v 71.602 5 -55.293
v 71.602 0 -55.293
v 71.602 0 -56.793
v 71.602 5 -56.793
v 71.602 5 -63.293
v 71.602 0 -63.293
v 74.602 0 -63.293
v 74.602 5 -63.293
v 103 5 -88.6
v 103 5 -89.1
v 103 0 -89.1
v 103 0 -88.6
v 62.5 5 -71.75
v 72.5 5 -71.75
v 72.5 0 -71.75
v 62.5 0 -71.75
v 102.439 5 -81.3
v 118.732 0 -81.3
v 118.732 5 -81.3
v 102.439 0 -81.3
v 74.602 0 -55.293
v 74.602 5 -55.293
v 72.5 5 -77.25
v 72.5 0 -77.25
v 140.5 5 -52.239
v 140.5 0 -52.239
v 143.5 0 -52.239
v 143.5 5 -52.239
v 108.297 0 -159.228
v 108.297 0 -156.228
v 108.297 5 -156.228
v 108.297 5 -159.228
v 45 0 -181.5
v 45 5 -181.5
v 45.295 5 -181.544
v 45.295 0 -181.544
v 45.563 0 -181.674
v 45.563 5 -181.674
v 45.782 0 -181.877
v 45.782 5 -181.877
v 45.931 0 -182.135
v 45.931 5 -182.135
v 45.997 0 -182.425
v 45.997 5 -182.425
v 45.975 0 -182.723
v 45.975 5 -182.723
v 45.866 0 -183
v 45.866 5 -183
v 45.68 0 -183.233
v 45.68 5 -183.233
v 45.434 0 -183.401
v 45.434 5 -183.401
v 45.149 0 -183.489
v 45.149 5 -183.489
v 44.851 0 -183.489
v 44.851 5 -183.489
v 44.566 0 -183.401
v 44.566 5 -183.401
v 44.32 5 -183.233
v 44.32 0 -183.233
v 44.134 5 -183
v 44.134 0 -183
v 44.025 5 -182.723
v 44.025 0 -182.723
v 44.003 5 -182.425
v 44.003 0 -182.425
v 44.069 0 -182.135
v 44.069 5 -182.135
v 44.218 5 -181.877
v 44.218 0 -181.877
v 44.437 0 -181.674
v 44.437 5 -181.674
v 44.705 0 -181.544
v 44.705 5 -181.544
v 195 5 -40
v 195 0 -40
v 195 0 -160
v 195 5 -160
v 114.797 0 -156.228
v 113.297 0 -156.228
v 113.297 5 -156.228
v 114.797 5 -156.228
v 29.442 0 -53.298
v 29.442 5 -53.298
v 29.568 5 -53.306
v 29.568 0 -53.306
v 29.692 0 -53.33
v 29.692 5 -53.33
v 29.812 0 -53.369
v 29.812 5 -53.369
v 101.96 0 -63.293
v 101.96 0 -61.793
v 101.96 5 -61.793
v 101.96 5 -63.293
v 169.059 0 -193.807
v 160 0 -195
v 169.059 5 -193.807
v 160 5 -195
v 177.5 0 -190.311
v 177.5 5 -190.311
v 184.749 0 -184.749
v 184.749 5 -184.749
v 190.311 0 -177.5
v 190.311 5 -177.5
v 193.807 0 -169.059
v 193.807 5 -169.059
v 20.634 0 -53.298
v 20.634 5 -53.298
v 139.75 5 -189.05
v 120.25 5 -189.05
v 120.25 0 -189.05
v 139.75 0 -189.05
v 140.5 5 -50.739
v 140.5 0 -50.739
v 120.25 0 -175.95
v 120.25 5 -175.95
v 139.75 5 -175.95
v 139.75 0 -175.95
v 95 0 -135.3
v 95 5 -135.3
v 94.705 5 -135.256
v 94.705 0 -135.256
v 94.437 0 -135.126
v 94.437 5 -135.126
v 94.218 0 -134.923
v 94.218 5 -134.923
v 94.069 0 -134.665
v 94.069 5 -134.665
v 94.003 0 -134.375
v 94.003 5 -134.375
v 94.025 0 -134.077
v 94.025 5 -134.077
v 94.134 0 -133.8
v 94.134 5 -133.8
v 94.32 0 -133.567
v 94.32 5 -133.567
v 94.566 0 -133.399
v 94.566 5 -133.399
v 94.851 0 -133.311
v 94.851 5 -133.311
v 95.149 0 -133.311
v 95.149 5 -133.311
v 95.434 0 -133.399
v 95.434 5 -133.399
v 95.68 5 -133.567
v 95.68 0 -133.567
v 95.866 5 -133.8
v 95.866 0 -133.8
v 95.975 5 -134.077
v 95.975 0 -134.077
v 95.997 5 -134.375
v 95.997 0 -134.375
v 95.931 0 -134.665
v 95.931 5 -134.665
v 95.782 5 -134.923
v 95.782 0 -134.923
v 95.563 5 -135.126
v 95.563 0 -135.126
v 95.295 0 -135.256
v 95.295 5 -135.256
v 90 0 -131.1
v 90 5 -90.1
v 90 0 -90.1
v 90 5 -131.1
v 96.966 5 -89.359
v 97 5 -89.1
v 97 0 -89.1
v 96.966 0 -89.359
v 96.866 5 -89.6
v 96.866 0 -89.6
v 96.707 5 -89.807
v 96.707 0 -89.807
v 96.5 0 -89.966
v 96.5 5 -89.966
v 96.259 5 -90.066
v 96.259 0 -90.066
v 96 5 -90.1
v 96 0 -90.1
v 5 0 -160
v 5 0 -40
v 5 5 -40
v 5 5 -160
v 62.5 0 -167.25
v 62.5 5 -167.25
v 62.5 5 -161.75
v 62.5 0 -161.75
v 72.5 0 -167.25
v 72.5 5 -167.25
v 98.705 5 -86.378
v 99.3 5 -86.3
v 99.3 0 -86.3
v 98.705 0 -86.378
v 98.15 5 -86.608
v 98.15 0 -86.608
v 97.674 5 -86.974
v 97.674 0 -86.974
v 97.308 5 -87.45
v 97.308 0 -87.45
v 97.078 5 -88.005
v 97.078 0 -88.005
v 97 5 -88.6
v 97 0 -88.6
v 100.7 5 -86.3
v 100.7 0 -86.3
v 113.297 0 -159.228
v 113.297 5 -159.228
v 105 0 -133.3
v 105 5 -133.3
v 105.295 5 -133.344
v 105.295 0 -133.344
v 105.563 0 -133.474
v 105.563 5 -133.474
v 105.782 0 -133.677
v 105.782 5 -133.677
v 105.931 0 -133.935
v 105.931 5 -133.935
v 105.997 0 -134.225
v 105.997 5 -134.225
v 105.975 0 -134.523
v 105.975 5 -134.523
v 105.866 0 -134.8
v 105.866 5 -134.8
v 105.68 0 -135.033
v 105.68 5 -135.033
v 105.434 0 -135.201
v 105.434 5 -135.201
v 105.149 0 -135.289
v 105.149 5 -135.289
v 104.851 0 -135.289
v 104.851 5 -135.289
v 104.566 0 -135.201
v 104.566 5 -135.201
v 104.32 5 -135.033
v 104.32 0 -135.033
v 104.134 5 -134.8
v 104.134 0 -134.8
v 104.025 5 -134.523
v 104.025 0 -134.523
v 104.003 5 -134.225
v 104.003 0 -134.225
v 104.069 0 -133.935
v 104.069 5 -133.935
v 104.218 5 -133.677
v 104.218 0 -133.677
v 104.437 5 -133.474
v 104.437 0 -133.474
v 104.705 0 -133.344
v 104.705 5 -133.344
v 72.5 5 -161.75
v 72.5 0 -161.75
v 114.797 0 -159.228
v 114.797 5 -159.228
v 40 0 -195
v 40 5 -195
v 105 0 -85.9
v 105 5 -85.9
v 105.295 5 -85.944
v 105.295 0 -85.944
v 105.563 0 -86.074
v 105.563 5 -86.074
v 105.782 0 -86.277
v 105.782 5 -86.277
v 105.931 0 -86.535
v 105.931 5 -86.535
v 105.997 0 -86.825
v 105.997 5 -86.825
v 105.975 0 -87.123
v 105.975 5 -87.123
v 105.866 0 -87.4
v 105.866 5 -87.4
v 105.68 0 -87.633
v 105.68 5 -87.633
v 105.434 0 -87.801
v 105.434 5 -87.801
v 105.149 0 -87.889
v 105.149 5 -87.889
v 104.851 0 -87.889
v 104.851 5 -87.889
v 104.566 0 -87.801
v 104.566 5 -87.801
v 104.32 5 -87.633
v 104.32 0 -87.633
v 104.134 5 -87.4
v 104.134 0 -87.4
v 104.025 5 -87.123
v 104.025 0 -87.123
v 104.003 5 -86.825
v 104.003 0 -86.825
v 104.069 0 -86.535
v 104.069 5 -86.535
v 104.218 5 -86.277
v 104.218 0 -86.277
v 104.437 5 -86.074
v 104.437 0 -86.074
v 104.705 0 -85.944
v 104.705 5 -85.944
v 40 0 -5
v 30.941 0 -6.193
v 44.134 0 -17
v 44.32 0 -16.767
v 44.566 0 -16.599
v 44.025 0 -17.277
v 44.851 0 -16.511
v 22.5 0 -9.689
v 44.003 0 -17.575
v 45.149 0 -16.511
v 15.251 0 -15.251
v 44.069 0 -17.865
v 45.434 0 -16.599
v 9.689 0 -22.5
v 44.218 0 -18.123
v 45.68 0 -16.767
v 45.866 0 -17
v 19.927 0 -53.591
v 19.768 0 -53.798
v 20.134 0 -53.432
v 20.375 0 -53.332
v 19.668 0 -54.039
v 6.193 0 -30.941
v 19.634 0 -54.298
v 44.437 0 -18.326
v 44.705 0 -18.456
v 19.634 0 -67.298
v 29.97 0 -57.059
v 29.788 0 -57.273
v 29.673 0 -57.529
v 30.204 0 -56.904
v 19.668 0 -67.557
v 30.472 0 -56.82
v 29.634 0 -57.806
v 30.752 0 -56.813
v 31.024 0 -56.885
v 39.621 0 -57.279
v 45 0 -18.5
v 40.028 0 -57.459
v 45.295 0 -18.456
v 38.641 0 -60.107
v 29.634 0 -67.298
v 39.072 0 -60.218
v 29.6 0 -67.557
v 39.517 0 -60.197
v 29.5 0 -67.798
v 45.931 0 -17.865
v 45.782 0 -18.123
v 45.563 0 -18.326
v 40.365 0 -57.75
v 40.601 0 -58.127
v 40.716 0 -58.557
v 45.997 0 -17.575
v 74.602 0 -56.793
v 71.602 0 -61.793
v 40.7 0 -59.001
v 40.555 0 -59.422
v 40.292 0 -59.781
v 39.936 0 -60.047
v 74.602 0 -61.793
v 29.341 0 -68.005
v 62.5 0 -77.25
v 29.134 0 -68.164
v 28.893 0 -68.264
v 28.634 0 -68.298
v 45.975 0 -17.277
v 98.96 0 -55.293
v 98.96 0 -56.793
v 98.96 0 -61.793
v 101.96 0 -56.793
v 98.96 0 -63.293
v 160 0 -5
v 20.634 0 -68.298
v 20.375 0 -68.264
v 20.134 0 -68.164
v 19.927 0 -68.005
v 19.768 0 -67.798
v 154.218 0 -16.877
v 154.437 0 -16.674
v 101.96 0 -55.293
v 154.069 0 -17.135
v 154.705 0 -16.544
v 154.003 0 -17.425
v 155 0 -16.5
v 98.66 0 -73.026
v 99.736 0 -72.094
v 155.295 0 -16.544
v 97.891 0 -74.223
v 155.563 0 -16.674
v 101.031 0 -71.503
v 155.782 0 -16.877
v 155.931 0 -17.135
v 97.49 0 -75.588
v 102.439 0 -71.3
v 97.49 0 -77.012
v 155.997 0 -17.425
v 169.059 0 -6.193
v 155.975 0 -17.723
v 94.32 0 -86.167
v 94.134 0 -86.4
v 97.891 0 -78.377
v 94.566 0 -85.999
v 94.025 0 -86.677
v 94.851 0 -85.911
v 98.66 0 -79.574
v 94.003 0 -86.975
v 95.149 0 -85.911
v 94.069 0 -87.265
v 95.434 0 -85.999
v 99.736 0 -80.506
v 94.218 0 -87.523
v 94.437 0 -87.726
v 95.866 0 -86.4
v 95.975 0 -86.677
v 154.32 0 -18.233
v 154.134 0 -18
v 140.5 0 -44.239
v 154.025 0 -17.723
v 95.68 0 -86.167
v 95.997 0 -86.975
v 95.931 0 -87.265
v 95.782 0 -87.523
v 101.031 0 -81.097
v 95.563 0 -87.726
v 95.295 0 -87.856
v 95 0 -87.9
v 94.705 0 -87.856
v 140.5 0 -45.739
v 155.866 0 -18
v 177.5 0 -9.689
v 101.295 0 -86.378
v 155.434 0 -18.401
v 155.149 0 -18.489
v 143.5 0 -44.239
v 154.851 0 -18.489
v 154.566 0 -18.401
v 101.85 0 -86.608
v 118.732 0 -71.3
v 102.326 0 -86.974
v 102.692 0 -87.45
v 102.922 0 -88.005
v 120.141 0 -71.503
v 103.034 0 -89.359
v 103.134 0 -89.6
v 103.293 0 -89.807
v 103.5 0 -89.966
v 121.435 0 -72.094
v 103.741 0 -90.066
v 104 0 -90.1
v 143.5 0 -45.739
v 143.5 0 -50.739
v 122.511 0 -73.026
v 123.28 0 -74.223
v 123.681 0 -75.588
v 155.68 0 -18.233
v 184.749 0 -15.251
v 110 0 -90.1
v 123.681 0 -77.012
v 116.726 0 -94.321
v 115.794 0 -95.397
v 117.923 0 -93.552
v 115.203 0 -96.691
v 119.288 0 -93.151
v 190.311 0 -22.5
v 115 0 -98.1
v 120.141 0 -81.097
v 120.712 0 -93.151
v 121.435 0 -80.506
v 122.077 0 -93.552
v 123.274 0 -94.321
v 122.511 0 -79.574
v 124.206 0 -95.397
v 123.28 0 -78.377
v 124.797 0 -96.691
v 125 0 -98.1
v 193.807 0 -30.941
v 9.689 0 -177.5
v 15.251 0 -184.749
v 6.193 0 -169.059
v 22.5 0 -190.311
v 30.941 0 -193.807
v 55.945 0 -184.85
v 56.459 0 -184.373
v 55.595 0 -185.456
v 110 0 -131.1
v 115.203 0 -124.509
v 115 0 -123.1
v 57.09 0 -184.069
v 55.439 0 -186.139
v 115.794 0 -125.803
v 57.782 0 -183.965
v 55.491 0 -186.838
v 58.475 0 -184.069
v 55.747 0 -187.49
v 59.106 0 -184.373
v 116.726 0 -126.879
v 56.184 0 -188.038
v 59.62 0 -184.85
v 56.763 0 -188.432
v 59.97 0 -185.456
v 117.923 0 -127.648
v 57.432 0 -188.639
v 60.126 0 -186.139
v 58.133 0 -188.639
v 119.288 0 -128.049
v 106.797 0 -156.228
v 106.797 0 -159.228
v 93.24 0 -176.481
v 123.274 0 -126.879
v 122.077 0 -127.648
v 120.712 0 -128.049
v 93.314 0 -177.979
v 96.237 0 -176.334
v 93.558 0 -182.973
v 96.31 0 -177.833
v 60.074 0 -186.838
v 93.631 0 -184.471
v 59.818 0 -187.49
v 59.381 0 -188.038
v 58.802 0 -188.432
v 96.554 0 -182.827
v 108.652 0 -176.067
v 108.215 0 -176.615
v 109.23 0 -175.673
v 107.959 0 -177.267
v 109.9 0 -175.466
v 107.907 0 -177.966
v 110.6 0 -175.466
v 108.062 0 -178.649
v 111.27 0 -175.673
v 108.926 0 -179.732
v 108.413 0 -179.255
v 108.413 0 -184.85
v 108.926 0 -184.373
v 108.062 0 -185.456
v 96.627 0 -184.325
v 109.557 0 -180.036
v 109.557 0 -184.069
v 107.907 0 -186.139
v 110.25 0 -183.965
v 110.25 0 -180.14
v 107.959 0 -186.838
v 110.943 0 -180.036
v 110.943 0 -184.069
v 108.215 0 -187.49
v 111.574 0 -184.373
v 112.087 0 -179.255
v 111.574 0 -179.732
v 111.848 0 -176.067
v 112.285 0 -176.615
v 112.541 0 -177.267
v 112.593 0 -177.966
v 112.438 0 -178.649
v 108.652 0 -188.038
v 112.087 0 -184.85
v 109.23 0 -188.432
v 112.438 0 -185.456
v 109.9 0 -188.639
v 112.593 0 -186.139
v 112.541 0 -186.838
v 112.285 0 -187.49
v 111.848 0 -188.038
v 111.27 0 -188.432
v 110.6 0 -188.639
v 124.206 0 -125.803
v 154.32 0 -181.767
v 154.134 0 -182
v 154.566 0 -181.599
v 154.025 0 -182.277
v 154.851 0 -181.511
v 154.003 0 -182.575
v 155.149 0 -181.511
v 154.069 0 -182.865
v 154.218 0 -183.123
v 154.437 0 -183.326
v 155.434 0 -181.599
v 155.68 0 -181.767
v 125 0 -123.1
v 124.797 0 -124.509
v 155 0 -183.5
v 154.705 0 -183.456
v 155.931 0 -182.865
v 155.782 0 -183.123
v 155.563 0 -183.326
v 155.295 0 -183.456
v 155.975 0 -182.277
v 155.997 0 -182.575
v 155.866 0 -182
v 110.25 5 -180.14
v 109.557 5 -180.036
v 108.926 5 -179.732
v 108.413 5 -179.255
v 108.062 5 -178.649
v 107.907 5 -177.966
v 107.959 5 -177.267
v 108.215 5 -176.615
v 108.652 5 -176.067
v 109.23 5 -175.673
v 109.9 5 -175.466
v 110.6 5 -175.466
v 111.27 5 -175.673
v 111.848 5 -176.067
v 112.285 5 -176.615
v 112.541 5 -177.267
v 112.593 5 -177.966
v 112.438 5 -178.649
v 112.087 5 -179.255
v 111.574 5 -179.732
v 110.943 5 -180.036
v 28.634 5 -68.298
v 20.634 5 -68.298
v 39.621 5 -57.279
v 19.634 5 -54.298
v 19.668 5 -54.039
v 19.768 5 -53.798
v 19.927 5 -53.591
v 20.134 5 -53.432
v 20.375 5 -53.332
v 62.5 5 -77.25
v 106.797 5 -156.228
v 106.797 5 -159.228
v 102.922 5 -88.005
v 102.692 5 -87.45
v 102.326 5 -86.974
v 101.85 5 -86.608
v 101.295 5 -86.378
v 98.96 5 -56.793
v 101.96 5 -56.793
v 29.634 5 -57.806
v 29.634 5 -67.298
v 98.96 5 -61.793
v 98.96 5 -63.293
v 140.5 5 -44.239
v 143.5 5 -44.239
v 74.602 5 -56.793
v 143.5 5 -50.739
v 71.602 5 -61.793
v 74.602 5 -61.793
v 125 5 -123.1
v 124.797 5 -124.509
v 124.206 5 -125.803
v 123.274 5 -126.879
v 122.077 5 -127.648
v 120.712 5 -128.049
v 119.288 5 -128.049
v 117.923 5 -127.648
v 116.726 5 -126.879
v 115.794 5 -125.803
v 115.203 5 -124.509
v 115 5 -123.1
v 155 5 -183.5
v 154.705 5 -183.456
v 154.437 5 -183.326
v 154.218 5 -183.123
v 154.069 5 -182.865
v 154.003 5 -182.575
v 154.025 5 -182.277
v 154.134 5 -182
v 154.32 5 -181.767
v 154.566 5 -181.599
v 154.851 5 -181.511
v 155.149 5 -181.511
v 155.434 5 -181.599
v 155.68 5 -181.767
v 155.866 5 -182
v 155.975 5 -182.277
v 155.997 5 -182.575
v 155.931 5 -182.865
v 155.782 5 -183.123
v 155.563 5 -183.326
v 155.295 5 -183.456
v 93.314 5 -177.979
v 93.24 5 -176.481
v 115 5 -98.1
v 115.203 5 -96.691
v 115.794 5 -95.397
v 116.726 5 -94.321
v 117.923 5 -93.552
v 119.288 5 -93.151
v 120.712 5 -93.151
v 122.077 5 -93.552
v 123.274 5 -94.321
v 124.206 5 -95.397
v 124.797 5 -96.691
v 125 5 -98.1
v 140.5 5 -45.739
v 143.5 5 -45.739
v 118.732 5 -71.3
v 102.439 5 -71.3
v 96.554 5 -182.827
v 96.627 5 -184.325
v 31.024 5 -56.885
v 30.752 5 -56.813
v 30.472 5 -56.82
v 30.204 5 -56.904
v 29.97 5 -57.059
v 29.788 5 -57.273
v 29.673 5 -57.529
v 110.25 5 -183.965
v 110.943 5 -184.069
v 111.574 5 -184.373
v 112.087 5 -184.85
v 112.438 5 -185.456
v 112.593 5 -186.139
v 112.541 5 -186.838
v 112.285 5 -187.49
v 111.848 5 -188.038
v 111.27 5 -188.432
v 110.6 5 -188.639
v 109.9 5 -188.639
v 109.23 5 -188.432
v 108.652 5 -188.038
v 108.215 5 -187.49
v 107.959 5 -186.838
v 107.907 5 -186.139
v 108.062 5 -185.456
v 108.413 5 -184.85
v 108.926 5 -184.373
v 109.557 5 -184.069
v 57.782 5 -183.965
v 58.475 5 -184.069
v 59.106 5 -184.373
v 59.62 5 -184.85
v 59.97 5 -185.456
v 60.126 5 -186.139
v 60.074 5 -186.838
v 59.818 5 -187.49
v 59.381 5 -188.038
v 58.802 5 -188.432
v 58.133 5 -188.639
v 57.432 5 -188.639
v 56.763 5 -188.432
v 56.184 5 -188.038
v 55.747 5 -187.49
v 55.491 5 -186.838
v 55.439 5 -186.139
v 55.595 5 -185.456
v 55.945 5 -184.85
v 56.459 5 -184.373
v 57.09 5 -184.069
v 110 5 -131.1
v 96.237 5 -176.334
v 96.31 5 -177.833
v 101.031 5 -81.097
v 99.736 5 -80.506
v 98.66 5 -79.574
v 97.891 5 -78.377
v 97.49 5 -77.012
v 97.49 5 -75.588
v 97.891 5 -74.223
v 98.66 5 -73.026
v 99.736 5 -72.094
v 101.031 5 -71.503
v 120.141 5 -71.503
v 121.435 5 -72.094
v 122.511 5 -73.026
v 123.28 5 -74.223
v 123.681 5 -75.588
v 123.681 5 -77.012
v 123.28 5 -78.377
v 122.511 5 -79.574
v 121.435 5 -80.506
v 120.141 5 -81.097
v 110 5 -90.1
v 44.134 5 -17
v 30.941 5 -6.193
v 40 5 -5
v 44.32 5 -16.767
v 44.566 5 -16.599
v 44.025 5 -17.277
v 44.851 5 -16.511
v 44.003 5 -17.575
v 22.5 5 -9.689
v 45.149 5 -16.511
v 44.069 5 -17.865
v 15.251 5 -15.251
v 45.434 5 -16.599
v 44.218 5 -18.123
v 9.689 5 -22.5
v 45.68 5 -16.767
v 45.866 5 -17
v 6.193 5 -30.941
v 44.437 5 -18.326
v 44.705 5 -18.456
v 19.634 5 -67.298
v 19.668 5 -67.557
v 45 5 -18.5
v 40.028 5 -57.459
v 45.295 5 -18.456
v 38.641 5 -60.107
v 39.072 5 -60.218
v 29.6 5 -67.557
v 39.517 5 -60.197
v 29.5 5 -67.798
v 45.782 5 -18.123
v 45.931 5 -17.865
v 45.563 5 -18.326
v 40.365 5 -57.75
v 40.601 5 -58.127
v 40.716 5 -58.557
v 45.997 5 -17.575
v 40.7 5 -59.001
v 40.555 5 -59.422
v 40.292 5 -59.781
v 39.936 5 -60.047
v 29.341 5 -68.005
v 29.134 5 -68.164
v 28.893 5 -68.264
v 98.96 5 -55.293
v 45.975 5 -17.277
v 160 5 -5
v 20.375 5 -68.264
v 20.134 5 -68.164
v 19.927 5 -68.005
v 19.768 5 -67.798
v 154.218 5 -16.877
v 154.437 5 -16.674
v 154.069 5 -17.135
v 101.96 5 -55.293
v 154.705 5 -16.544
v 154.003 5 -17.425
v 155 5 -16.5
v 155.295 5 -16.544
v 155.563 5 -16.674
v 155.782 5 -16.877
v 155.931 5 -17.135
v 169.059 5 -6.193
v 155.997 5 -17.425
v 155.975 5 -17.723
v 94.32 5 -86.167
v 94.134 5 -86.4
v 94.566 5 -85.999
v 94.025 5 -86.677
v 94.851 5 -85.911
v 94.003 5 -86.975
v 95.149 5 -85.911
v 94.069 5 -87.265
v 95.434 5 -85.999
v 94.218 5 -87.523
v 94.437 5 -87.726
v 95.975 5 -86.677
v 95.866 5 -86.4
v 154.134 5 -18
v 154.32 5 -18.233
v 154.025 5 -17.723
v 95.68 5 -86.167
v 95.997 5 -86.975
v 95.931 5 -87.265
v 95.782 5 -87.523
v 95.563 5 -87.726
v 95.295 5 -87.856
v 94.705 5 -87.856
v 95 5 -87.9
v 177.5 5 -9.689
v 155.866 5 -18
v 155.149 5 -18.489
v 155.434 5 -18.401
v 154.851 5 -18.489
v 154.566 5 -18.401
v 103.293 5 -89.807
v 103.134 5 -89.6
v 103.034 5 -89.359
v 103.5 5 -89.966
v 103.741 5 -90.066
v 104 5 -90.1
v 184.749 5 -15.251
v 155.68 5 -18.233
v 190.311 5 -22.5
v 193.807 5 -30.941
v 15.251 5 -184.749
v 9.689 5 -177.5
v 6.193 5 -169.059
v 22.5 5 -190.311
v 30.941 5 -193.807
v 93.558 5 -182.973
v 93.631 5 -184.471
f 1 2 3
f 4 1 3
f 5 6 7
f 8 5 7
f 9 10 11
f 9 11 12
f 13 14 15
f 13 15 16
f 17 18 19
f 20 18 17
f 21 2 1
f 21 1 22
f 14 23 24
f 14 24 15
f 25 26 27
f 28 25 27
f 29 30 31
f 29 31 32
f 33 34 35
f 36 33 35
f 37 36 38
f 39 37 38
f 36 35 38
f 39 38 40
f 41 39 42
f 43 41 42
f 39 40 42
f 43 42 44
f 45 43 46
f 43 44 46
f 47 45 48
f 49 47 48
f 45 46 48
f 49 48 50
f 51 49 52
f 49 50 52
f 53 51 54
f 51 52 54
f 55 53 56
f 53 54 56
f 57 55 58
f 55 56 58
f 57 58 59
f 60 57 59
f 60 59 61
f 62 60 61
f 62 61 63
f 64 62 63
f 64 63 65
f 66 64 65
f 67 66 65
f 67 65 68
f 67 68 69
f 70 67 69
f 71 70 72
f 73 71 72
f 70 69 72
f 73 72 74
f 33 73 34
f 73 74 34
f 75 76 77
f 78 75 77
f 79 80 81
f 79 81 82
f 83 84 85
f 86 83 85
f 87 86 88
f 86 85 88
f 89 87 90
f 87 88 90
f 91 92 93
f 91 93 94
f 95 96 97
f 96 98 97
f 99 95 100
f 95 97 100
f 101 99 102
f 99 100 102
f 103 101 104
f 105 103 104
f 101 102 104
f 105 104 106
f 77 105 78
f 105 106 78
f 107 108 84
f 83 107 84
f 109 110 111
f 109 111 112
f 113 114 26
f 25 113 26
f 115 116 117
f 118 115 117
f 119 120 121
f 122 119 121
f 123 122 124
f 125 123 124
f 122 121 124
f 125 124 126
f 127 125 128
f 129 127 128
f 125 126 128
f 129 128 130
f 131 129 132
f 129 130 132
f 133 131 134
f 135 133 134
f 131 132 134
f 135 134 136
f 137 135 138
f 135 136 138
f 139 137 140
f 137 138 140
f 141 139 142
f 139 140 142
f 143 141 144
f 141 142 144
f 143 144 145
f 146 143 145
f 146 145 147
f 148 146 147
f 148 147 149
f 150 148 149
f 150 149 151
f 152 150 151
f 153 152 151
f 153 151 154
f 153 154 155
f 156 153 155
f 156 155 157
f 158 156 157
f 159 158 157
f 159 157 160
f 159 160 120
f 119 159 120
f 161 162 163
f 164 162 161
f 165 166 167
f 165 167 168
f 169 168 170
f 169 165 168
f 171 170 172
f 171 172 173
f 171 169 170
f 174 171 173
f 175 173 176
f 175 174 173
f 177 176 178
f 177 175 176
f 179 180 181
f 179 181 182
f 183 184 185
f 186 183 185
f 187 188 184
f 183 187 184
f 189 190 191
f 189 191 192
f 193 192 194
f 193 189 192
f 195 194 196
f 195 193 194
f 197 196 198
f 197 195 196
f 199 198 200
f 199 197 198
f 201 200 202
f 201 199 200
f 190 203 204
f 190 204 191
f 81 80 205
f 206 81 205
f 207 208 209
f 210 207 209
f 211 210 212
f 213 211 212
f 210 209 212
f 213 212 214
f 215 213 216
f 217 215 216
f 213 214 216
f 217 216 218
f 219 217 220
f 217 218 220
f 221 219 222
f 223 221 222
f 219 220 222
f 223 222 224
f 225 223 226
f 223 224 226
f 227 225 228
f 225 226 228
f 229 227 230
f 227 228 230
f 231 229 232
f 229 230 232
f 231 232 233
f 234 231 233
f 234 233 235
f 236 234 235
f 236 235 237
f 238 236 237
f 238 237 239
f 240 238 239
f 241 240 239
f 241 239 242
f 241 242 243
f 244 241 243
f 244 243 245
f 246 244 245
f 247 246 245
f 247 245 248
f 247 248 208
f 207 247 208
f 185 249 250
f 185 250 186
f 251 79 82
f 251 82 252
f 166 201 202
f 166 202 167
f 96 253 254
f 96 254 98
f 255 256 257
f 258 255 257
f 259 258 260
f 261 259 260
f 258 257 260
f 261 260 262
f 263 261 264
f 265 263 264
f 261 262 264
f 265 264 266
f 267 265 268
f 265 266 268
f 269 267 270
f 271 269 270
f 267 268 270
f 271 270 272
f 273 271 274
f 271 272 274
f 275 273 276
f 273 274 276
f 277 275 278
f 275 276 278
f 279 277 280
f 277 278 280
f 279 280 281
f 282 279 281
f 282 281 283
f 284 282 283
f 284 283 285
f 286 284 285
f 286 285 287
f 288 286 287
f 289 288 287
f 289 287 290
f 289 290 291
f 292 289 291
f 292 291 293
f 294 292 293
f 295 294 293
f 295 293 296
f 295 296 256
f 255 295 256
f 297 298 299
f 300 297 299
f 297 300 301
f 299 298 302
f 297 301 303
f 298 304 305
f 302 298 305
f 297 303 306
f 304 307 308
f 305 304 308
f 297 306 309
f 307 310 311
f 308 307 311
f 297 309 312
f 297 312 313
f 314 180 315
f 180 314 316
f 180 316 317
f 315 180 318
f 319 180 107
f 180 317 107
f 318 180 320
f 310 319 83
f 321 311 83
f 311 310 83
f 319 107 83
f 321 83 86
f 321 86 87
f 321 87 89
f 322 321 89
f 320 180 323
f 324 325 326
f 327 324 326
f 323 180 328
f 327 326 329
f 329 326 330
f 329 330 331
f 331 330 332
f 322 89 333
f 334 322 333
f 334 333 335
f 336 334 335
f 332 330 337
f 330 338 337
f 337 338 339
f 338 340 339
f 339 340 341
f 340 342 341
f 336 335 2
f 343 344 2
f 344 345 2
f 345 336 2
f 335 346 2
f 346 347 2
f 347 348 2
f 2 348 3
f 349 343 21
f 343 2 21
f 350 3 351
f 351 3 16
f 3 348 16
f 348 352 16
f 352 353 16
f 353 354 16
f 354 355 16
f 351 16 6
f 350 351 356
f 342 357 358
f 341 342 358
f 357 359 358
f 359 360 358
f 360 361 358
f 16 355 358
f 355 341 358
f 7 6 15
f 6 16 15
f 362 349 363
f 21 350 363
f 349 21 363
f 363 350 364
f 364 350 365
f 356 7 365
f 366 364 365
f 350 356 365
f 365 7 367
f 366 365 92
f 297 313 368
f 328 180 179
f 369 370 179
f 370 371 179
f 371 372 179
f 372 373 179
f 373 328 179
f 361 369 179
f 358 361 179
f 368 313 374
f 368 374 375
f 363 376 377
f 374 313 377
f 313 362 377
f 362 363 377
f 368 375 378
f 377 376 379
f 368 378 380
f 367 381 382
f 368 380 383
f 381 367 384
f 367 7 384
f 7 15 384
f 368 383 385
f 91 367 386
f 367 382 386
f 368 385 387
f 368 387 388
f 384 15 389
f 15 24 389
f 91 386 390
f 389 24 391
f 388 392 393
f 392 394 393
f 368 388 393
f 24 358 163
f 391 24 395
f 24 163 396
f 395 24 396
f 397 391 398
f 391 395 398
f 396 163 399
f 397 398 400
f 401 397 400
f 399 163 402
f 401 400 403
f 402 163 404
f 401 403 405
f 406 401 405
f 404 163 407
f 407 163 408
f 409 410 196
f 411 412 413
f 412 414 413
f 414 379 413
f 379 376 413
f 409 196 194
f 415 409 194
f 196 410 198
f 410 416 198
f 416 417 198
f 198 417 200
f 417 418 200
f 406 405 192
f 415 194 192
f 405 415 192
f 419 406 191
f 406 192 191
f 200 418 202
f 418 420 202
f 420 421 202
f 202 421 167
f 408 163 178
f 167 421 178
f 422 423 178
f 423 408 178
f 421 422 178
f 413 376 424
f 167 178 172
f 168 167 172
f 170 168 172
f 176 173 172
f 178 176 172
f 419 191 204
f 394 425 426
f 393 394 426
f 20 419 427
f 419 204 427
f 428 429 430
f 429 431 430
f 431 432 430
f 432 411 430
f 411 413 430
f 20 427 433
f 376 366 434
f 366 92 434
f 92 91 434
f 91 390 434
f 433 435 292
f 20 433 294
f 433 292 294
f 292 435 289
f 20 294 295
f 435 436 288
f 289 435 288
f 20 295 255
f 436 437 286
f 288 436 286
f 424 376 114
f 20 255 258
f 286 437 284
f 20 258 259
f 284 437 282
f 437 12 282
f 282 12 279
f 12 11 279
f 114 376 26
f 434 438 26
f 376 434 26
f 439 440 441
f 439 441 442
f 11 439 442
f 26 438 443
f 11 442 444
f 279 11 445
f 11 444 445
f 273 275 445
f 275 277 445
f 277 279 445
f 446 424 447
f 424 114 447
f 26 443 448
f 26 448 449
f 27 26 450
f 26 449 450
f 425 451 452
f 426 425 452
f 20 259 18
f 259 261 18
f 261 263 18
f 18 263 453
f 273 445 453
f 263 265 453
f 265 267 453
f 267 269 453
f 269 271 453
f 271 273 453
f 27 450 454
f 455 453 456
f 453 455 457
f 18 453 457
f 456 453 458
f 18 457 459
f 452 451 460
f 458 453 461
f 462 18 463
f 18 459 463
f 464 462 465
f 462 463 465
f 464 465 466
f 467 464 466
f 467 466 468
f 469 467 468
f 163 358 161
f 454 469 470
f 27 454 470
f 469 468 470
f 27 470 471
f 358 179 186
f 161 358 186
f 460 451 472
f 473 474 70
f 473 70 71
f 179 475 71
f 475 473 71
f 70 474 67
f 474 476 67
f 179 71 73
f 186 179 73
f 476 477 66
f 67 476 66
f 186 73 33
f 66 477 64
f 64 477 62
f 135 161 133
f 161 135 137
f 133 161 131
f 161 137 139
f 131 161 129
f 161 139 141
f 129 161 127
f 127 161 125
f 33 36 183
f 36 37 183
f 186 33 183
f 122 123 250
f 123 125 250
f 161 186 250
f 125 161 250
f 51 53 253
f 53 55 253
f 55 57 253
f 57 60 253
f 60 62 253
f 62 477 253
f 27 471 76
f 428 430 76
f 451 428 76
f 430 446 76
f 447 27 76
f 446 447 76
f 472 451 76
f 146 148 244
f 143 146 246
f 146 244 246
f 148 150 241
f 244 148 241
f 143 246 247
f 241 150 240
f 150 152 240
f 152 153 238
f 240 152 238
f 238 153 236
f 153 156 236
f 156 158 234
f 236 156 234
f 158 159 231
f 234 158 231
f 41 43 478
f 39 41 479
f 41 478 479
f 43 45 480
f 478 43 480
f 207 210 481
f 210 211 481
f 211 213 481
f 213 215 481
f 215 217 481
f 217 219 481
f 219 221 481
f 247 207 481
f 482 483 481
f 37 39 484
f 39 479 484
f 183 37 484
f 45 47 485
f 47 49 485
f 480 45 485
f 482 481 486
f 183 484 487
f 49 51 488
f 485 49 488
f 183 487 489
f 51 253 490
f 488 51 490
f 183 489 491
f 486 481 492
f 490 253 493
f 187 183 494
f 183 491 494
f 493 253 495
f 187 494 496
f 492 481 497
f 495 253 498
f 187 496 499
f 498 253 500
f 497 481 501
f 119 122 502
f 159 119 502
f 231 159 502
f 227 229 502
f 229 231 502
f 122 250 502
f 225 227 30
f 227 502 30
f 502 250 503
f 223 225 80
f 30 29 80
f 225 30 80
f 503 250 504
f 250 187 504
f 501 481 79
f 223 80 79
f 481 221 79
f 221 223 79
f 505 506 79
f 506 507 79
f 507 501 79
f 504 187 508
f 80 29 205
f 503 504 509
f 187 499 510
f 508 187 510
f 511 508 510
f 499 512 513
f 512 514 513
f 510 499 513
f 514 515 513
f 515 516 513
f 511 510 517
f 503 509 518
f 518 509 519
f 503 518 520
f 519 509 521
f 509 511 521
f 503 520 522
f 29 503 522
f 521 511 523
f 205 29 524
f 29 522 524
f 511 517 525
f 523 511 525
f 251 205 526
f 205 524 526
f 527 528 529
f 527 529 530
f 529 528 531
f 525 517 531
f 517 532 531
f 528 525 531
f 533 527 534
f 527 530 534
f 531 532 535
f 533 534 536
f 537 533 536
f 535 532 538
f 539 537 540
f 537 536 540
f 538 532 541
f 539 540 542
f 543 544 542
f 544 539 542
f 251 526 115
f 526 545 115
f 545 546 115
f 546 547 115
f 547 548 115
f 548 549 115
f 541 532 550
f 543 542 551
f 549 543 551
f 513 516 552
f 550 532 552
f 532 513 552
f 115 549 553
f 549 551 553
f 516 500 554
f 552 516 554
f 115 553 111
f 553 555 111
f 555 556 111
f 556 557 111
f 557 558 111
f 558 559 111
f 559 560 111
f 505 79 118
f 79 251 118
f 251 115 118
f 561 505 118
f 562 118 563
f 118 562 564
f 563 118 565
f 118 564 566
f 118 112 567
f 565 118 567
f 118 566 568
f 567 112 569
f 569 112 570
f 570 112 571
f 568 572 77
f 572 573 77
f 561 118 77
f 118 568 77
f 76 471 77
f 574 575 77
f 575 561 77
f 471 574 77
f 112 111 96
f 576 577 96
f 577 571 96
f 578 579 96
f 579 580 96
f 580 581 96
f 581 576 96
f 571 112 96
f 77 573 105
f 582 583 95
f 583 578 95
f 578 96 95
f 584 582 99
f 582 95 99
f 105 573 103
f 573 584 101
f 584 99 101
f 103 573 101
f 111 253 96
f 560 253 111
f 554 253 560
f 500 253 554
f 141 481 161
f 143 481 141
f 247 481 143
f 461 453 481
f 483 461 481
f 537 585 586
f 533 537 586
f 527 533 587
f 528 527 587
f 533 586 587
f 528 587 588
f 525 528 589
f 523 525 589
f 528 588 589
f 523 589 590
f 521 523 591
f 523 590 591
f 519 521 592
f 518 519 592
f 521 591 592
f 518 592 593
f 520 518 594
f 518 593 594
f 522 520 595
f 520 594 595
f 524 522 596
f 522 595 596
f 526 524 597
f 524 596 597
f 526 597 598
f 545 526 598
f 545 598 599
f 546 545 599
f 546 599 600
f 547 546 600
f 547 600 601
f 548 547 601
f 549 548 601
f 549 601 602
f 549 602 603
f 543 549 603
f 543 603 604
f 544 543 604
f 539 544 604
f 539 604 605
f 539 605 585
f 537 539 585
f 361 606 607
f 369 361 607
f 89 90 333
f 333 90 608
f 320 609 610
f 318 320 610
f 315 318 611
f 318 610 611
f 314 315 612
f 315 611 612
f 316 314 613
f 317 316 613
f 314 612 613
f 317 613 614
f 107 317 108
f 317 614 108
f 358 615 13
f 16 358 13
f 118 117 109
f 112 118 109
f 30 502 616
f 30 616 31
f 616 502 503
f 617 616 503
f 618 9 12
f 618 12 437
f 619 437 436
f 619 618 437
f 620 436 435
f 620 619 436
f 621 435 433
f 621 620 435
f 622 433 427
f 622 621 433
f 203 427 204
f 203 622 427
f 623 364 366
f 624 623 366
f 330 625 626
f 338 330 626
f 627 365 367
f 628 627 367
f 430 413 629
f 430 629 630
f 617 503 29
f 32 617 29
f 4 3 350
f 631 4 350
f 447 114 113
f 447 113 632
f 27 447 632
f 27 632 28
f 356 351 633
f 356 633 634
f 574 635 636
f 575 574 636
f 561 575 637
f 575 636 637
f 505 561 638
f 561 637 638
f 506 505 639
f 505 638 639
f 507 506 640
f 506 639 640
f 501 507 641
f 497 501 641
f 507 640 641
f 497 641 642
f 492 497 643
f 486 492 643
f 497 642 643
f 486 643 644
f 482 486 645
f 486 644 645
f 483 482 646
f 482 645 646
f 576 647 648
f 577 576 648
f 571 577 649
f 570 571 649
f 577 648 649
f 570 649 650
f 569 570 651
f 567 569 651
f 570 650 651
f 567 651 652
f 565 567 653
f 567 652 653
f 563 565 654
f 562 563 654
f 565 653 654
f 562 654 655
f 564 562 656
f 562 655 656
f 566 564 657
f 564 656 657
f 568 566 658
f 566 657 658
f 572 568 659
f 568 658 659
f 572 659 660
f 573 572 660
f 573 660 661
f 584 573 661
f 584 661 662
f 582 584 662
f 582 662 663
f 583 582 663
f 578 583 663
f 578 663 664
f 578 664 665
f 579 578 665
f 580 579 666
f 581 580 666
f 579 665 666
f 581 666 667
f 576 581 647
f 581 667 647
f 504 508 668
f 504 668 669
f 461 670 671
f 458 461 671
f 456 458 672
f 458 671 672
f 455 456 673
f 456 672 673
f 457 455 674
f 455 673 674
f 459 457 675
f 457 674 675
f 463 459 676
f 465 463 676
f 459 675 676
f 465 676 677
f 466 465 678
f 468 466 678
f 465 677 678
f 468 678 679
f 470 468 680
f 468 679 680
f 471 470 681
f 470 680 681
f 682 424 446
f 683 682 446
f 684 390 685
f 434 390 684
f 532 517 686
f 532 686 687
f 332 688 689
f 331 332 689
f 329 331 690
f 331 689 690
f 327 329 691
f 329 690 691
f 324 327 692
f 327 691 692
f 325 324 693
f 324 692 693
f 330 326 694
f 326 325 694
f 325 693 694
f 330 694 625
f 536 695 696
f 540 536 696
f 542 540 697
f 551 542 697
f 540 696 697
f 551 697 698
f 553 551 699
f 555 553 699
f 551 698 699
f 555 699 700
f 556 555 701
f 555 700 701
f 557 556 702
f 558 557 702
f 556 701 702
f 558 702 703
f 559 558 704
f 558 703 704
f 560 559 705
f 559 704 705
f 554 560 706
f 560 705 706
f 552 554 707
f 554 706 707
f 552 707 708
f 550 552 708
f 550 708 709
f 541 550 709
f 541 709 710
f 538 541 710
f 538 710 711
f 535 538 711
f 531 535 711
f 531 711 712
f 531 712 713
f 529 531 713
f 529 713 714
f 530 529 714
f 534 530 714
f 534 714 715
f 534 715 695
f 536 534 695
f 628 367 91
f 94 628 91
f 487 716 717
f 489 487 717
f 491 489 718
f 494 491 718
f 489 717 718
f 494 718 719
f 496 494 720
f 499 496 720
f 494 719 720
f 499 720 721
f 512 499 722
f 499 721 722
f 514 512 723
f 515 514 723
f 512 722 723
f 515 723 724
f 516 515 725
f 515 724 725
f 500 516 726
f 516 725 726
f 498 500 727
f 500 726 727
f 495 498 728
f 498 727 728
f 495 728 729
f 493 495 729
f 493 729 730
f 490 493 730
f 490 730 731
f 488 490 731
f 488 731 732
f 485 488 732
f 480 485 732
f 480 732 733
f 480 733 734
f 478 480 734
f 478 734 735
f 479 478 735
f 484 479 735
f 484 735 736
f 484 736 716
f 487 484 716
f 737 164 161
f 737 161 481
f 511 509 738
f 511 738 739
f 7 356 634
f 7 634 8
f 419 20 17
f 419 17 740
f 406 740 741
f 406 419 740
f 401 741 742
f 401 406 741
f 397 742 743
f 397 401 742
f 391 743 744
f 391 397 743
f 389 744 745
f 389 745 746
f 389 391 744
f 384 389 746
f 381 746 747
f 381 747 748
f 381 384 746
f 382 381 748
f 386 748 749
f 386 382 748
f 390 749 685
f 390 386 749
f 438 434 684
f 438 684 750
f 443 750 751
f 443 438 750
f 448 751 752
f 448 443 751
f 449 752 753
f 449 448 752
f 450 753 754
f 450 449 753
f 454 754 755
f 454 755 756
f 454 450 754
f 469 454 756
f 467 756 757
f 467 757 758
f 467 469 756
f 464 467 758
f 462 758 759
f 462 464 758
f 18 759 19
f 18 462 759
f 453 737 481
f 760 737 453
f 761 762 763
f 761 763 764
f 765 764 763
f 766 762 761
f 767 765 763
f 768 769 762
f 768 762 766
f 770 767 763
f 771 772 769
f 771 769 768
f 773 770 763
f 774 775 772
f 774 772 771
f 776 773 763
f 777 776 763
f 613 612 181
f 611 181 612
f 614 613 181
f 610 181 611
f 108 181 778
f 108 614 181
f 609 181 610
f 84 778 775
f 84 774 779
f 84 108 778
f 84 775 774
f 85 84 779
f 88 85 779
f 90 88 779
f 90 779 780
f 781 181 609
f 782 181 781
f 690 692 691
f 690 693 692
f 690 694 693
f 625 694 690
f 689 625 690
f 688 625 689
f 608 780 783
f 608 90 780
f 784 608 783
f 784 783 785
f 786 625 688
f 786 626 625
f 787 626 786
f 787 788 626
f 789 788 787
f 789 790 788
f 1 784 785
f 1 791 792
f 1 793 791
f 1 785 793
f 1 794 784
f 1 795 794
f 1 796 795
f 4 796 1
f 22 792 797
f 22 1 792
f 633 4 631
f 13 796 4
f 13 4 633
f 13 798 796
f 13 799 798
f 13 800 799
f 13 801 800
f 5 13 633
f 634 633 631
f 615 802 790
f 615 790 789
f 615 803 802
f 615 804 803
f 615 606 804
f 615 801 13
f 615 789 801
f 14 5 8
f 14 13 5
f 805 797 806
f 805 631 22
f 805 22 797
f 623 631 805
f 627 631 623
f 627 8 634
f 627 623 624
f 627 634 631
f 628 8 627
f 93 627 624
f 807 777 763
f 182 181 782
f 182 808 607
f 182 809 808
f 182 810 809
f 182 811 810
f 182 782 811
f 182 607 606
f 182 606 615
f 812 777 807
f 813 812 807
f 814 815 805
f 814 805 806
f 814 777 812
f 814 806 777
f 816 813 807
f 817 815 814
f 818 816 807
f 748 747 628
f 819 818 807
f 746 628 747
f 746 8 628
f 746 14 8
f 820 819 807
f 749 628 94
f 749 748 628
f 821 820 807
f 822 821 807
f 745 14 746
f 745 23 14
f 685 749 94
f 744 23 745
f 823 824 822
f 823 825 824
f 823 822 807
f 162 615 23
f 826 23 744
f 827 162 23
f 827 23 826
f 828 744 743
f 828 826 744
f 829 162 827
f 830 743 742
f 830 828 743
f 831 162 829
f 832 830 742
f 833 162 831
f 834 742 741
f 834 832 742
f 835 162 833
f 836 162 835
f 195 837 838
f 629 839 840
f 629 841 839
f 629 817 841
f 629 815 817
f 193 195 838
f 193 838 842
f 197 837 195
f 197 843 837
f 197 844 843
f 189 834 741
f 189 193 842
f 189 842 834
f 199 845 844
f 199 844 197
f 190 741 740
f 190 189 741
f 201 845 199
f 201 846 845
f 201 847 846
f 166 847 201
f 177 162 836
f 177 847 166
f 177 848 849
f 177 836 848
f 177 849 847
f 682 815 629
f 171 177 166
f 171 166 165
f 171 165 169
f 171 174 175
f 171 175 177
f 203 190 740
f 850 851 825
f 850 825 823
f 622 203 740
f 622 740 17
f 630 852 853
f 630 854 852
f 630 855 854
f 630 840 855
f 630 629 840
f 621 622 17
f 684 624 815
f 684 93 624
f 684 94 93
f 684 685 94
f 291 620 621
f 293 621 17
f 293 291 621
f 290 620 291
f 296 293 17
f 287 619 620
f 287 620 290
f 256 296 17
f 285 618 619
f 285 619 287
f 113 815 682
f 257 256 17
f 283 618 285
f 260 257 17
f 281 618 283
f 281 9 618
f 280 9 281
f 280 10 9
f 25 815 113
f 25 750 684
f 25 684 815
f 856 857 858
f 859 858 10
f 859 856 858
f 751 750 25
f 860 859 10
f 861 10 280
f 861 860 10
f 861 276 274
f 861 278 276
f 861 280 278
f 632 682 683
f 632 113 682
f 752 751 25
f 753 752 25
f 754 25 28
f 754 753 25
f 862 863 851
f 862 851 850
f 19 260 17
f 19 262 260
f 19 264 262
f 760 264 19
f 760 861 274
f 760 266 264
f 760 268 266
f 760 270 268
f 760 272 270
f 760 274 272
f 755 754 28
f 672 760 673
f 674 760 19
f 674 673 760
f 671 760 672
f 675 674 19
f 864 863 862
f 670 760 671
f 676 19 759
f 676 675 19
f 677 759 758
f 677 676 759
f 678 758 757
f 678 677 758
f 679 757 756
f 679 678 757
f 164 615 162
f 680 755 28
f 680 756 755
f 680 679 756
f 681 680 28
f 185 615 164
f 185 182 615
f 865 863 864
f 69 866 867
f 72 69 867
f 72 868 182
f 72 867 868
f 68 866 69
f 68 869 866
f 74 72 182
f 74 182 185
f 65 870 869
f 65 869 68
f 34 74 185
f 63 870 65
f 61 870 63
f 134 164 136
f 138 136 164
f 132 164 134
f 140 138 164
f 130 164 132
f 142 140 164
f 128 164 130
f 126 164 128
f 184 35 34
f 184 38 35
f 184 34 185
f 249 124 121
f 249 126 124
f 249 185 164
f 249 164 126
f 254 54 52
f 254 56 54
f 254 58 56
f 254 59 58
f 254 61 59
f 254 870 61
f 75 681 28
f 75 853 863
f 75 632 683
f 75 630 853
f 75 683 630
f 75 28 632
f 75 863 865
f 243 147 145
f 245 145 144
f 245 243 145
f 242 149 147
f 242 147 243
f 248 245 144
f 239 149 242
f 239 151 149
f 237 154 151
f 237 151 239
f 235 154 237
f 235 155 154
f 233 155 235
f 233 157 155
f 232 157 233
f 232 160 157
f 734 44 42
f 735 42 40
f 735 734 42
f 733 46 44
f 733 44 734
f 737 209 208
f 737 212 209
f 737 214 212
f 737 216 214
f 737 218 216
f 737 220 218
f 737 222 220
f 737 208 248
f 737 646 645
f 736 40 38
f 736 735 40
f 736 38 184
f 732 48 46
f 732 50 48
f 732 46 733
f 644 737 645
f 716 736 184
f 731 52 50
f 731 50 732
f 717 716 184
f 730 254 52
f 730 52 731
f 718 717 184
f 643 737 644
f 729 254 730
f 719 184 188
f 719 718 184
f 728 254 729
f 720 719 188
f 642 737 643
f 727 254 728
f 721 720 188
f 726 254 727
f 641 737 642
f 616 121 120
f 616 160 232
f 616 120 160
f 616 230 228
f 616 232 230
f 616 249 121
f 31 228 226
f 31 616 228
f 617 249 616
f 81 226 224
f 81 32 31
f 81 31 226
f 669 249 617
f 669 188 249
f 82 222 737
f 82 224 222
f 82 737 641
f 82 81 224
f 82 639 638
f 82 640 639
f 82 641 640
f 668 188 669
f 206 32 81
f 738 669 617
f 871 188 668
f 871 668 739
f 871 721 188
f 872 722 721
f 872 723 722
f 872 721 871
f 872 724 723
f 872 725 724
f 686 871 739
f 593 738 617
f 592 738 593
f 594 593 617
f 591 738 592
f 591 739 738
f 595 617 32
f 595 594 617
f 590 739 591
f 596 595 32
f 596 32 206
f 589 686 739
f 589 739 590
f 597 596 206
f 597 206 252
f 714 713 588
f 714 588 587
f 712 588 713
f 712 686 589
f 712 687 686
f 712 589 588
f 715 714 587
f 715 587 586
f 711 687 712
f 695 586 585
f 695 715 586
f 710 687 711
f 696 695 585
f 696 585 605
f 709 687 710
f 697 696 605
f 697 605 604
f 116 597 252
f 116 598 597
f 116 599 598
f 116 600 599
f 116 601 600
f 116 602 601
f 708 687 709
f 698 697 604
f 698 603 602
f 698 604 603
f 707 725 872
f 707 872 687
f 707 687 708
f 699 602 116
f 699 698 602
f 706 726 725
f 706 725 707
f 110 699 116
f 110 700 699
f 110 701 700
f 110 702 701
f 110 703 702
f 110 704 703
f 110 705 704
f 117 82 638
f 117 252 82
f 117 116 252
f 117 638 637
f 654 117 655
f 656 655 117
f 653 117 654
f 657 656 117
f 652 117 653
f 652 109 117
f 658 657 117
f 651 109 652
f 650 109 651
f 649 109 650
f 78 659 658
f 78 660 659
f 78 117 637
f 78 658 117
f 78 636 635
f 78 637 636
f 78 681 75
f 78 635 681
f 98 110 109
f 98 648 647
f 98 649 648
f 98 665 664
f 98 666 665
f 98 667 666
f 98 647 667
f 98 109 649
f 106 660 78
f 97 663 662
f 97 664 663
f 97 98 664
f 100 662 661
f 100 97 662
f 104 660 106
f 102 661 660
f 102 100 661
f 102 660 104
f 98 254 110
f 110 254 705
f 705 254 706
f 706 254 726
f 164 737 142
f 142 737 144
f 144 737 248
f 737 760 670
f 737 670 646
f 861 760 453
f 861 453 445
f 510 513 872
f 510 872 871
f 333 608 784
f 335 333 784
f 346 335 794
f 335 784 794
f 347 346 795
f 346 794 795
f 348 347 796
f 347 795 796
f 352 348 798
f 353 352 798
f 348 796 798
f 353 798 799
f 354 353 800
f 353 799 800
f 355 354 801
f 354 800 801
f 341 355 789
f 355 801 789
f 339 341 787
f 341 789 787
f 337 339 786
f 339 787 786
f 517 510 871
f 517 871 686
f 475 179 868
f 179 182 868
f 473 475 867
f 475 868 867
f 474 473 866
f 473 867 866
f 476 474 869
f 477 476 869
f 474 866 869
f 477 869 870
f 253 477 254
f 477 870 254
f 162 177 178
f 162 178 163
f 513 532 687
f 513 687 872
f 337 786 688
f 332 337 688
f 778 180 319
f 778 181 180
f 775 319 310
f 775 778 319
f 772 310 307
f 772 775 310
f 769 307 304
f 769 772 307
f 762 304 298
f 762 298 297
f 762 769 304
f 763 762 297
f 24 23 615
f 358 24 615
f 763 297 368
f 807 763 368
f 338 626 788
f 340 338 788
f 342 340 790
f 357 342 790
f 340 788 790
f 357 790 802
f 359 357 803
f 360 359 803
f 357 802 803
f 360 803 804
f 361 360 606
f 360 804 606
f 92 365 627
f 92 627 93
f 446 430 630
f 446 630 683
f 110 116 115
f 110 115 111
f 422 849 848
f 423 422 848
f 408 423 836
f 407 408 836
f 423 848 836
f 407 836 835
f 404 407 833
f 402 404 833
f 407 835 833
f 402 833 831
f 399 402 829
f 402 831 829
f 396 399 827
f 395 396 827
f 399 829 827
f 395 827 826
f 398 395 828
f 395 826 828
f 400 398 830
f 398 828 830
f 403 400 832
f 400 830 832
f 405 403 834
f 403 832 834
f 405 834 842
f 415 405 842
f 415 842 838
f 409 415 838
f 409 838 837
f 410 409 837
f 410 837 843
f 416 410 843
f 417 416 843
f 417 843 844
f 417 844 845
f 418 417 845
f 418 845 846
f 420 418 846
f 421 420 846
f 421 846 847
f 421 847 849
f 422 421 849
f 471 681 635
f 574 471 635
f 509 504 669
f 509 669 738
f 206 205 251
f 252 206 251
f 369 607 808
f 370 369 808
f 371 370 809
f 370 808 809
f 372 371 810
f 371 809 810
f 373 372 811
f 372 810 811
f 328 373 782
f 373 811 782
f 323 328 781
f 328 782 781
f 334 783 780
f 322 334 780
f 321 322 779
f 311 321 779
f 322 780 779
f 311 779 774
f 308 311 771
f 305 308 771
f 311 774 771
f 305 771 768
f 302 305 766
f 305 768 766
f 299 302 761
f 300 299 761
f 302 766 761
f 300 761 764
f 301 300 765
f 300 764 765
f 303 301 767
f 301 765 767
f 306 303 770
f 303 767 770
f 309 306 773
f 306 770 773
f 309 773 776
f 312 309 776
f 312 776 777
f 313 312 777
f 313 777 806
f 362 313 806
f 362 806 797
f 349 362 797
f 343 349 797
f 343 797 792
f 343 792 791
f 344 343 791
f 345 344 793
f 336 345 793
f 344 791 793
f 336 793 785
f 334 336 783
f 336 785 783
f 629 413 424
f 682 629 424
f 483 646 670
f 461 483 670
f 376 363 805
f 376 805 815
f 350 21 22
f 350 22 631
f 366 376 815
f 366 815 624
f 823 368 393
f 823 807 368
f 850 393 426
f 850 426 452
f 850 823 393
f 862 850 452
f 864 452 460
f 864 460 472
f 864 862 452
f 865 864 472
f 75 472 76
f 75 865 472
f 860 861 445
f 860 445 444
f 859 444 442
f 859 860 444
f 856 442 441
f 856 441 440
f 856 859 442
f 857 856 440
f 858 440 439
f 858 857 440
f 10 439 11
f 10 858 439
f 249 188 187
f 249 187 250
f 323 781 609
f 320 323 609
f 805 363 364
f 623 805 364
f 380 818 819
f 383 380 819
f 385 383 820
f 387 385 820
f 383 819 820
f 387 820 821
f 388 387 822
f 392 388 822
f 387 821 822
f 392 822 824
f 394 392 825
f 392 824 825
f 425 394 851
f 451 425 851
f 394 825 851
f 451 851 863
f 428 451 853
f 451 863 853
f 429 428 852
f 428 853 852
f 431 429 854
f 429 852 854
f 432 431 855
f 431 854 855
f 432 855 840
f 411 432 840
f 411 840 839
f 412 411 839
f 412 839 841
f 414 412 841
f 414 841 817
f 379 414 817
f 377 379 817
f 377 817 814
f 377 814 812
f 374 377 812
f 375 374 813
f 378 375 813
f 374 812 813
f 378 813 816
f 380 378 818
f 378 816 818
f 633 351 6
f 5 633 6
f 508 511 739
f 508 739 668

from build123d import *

# Parameters (mm, degrees)
ESBO_O1_W                   = 190
ESBO_O1_H                   = 190
RESSALTO_EXTRUS_O1_DEPTH    = 5
ESBO_O2_R                   = 1
CORTE_EXTRUS_O1_DEPTH       = 276.816968296
ESBO_O3_R                   = 1
CORTE_EXTRUS_O2_DEPTH       = 5
FILETE1_R                   = 35
ESBO_O4_W                   = 19.5
ESBO_O4_H                   = 13.1
CORTE_EXTRUS_O3_DEPTH       = 276.816968296
SKETCH1_R                   = 2.35
CUT_EXTRUDE1_DEPTH          = 10
ESBO_O8_W                   = 10
ESBO_O8_H                   = 5.5
CORTE_EXTRUS_O4_DEPTH       = 276.816968296
CORTE_EXTRUS_O5_DEPTH       = 276.816968296
CORTE_EXTRUS_O7_DEPTH       = 276.816968296
CORTE_EXTRUS_O8_START       = -5
CORTE_EXTRUS_O8_OUTLINE_W   = 1.5
CORTE_EXTRUS_O8_OUTLINE_H   = 3
CORTE_EXTRUS_O8_OUTLINE_W_2 = 3
CORTE_EXTRUS_O8_OUTLINE_H_2 = 1.5
CORTE_EXTRUS_O8_DEPTH       = 5
CORTE_EXTRUS_O9_DEPTH       = 5


# Read off the part's stored shape, not the designer's step: Corte-extrusão8, Corte-extrusão9
with BuildPart() as part:
    # Esboço1 → Ressalto-extrusão1 (new body)
    with BuildSketch(Plane(origin=(0, 0, 0), x_dir=(1, 0, 0), z_dir=(0, 1, 0))):
        with Locations((100, 100)):
            Rectangle(ESBO_O1_W, ESBO_O1_H)
    extrude(amount=RESSALTO_EXTRUS_O1_DEPTH)

    # Esboço2 → Corte-extrusão1 (cut, through all)
    with BuildSketch(Plane(origin=(0, 5, 0), x_dir=(1, 0, 0), z_dir=(0, 1, 0))):
        with Locations(Location((105, 86.9, 0), (0, 0, 270))):
            Circle(ESBO_O2_R)
        with Locations(Location((105, 134.3, 0), (0, 0, 270))):
            Circle(ESBO_O2_R)
        with Locations(Location((95, 86.9, 0), (0, 0, 90))):
            Circle(ESBO_O2_R)
        with Locations(Location((95, 134.3, 0), (0, 0, 90))):
            Circle(ESBO_O2_R)
        with BuildLine():
            Line((90, 131.1), (110, 131.1))
            Line((110, 131.1), (110, 90.1))
            Line((110, 90.1), (104, 90.1))
            ThreePointArc((104, 90.1), (103.292893219, 89.807106781), (103, 89.1))
            Line((103, 89.1), (103, 88.6))
            ThreePointArc((103, 88.6), (102.326345597, 86.973654403), (100.7, 86.3))
            Line((100.7, 86.3), (99.3, 86.3))
            ThreePointArc((99.3, 86.3), (97.673654403, 86.973654403), (97, 88.6))
            Line((97, 88.6), (97, 89.1))
            ThreePointArc((97, 89.1), (96.707106781, 89.807106781), (96, 90.1))
            Line((96, 90.1), (90, 90.1))
            Line((90, 90.1), (90, 131.1))
        make_face()
    extrude(amount=-CORTE_EXTRUS_O1_DEPTH, mode=Mode.SUBTRACT)

    # Esboço3 → Corte-extrusão2 (cut)
    with BuildSketch(Plane(origin=(0, 5, 0), x_dir=(1, 0, 0), z_dir=(0, 1, 0))):
        with Locations(Location((45, 182.5, 0), (0, 0, 270))):
            Circle(ESBO_O3_R)
        with Locations(Location((45, 17.5, 0), (0, 0, 90))):
            Circle(ESBO_O3_R)
        with Locations(Location((155, 17.5, 0), (0, 0, 270))):
            Circle(ESBO_O3_R)
        with Locations(Location((155, 182.5, 0), (0, 0, 90))):
            Circle(ESBO_O3_R)
    extrude(amount=-CORTE_EXTRUS_O2_DEPTH, mode=Mode.SUBTRACT)

    # Filete1
    filete1_edges = [part.edges().sort_by_distance(p)[0] for p in [
        (5, 2.5, -195),
        (195, 2.5, -195),
        (195, 2.5, -5),
        (5, 2.5, -5),
    ]]
    fillet(filete1_edges, radius=FILETE1_R)

    # Esboço4 → Corte-extrusão3 (cut, through all)
    with BuildSketch(Plane(origin=(0, 5, 0), x_dir=(1, 0, 0), z_dir=(0, 1, 0))):
        with Locations((130, 182.5)):
            Rectangle(ESBO_O4_W, ESBO_O4_H)
    extrude(amount=-CORTE_EXTRUS_O3_DEPTH, mode=Mode.SUBTRACT)

    # Sketch1 → Cut-Extrude1 (cut)
    with BuildSketch(Plane(origin=(0, 5, 0), x_dir=(1, 0, 0), z_dir=(0, 1, 0))):
        with Locations(Location((110.25, 177.79006803, 0), (0, 0, 90))):
            Circle(SKETCH1_R)
        with Locations(Location((57.782465694, 186.314872597, 0), (0, 0, 270))):
            Circle(SKETCH1_R)
        with Locations(Location((110.25, 186.314872597, 0), (0, 0, 270))):
            Circle(SKETCH1_R)
    extrude(amount=-CUT_EXTRUDE1_DEPTH, mode=Mode.SUBTRACT)

    # Esboço8 → Corte-extrusão4 (cut, through all)
    with BuildSketch(Plane(origin=(0, 5, 0), x_dir=(-1, 0, 0), z_dir=(0, 1, 0))):
        with Locations((-67.499895869, -164.49975707)):
            Rectangle(ESBO_O8_W, ESBO_O8_H)
        with Locations((-67.499895869, -74.50024293)):
            Rectangle(ESBO_O8_W, ESBO_O8_H)
    extrude(amount=-CORTE_EXTRUS_O4_DEPTH, mode=Mode.SUBTRACT)

    # Esboço10 → Corte-extrusão5 (cut, through all)
    with BuildSketch(Plane(origin=(0, 5, 0), x_dir=(1, 0, 0), z_dir=(0, 1, 0))):
        with BuildLine():
            Line((29.81236761, 53.368860086), (39.621292879, 57.27884335))
            ThreePointArc((39.621292879, 57.27884335), (40.643023517, 59.216773827), (38.64138653, 60.107255383))
            Line((38.64138653, 60.107255383), (31.023574835, 56.885452176))
            ThreePointArc((31.023574835, 56.885452176), (30.081566568, 56.972943613), (29.634049405, 57.806467887))
            Line((29.634049405, 57.806467887), (29.634049405, 67.297779802))
            ThreePointArc((29.634049405, 67.297779802), (29.341156187, 68.004886583), (28.634049405, 68.297779802))
            Line((28.634049405, 68.297779802), (20.634049405, 68.297779802))
            ThreePointArc((20.634049405, 68.297779802), (19.926942624, 68.004886583), (19.634049405, 67.297779802))
            Line((19.634049405, 67.297779802), (19.634049405, 54.297779802))
            ThreePointArc((19.634049405, 54.297779802), (19.926942624, 53.590673021), (20.634049405, 53.297779802))
            Line((20.634049405, 53.297779802), (29.442086417, 53.297779802))
            ThreePointArc((29.442086417, 53.297779802), (29.63060735, 53.31571063), (29.81236761, 53.368860086))
        make_face()
    extrude(amount=-CORTE_EXTRUS_O5_DEPTH, mode=Mode.SUBTRACT)

    # Esboço12 → Corte-extrusão7 (cut, through all)
    with BuildSketch(Plane(origin=(0, 5, 0), x_dir=(1, 0, 0), z_dir=(0, 1, 0))):
        with BuildLine():
            Line((115, 123.1), (115, 98.1))
            ThreePointArc((115, 98.1), (120, 93.1), (125, 98.1))
            Line((125, 98.1), (125, 123.1))
            ThreePointArc((125, 123.1), (120, 128.1), (115, 123.1))
        make_face()
    extrude(amount=-CORTE_EXTRUS_O7_DEPTH, mode=Mode.SUBTRACT)

    # Corte-extrusão8 outline → Corte-extrusão8 (cut)
    with BuildSketch(Plane(origin=(0, 5, 0), x_dir=(1, 0, 0), z_dir=(0, 1, 0)).offset(CORTE_EXTRUS_O8_START)):
        Polygon((93.630915931, 184.471333361), (93.557673586, 182.973122575), (96.554095158, 182.826637886), (96.627337502, 184.324848672), align=None)
        Polygon((96.309954009, 177.832601933), (93.313532437, 177.979086622), (93.240290093, 176.480875836), (96.236711664, 176.334391147), align=None)
        with Locations((114.04726065, 157.727587795)):
            Rectangle(CORTE_EXTRUS_O8_OUTLINE_W, CORTE_EXTRUS_O8_OUTLINE_H)
        with Locations((107.54726065, 157.727587795)):
            Rectangle(CORTE_EXTRUS_O8_OUTLINE_W, CORTE_EXTRUS_O8_OUTLINE_H)
        with Locations((100.460308888, 62.543165179)):
            Rectangle(CORTE_EXTRUS_O8_OUTLINE_W_2, CORTE_EXTRUS_O8_OUTLINE_H_2)
        with Locations((73.101842496, 62.543165179)):
            Rectangle(CORTE_EXTRUS_O8_OUTLINE_W_2, CORTE_EXTRUS_O8_OUTLINE_H_2)
        with Locations((100.460308888, 56.043165179)):
            Rectangle(CORTE_EXTRUS_O8_OUTLINE_W_2, CORTE_EXTRUS_O8_OUTLINE_H_2)
        with Locations((73.101842496, 56.043165179)):
            Rectangle(CORTE_EXTRUS_O8_OUTLINE_W_2, CORTE_EXTRUS_O8_OUTLINE_H_2)
        with Locations((142, 51.488873394)):
            Rectangle(CORTE_EXTRUS_O8_OUTLINE_W_2, CORTE_EXTRUS_O8_OUTLINE_H_2)
        with Locations((142, 44.988873394)):
            Rectangle(CORTE_EXTRUS_O8_OUTLINE_W_2, CORTE_EXTRUS_O8_OUTLINE_H_2)
    extrude(amount=CORTE_EXTRUS_O8_DEPTH, mode=Mode.SUBTRACT)

    # Corte-extrusão9 outline → Corte-extrusão9 (cut)
    with BuildSketch(Plane(origin=(0, 0, 0), x_dir=(1, 0, 0), z_dir=(0, 1, 0))):
        with BuildLine():
            Line((102.439246138, 71.3), (118.732019964, 71.3))
            ThreePointArc((118.732019964, 71.3), (123.732019964, 76.3), (118.732019964, 81.3))
            Line((118.732019964, 81.3), (102.439246138, 81.3))
            ThreePointArc((102.439246138, 81.3), (97.439246138, 76.3), (102.439246138, 71.3))
        make_face()
    extrude(amount=CORTE_EXTRUS_O9_DEPTH, mode=Mode.SUBTRACT)


solid = part.part
